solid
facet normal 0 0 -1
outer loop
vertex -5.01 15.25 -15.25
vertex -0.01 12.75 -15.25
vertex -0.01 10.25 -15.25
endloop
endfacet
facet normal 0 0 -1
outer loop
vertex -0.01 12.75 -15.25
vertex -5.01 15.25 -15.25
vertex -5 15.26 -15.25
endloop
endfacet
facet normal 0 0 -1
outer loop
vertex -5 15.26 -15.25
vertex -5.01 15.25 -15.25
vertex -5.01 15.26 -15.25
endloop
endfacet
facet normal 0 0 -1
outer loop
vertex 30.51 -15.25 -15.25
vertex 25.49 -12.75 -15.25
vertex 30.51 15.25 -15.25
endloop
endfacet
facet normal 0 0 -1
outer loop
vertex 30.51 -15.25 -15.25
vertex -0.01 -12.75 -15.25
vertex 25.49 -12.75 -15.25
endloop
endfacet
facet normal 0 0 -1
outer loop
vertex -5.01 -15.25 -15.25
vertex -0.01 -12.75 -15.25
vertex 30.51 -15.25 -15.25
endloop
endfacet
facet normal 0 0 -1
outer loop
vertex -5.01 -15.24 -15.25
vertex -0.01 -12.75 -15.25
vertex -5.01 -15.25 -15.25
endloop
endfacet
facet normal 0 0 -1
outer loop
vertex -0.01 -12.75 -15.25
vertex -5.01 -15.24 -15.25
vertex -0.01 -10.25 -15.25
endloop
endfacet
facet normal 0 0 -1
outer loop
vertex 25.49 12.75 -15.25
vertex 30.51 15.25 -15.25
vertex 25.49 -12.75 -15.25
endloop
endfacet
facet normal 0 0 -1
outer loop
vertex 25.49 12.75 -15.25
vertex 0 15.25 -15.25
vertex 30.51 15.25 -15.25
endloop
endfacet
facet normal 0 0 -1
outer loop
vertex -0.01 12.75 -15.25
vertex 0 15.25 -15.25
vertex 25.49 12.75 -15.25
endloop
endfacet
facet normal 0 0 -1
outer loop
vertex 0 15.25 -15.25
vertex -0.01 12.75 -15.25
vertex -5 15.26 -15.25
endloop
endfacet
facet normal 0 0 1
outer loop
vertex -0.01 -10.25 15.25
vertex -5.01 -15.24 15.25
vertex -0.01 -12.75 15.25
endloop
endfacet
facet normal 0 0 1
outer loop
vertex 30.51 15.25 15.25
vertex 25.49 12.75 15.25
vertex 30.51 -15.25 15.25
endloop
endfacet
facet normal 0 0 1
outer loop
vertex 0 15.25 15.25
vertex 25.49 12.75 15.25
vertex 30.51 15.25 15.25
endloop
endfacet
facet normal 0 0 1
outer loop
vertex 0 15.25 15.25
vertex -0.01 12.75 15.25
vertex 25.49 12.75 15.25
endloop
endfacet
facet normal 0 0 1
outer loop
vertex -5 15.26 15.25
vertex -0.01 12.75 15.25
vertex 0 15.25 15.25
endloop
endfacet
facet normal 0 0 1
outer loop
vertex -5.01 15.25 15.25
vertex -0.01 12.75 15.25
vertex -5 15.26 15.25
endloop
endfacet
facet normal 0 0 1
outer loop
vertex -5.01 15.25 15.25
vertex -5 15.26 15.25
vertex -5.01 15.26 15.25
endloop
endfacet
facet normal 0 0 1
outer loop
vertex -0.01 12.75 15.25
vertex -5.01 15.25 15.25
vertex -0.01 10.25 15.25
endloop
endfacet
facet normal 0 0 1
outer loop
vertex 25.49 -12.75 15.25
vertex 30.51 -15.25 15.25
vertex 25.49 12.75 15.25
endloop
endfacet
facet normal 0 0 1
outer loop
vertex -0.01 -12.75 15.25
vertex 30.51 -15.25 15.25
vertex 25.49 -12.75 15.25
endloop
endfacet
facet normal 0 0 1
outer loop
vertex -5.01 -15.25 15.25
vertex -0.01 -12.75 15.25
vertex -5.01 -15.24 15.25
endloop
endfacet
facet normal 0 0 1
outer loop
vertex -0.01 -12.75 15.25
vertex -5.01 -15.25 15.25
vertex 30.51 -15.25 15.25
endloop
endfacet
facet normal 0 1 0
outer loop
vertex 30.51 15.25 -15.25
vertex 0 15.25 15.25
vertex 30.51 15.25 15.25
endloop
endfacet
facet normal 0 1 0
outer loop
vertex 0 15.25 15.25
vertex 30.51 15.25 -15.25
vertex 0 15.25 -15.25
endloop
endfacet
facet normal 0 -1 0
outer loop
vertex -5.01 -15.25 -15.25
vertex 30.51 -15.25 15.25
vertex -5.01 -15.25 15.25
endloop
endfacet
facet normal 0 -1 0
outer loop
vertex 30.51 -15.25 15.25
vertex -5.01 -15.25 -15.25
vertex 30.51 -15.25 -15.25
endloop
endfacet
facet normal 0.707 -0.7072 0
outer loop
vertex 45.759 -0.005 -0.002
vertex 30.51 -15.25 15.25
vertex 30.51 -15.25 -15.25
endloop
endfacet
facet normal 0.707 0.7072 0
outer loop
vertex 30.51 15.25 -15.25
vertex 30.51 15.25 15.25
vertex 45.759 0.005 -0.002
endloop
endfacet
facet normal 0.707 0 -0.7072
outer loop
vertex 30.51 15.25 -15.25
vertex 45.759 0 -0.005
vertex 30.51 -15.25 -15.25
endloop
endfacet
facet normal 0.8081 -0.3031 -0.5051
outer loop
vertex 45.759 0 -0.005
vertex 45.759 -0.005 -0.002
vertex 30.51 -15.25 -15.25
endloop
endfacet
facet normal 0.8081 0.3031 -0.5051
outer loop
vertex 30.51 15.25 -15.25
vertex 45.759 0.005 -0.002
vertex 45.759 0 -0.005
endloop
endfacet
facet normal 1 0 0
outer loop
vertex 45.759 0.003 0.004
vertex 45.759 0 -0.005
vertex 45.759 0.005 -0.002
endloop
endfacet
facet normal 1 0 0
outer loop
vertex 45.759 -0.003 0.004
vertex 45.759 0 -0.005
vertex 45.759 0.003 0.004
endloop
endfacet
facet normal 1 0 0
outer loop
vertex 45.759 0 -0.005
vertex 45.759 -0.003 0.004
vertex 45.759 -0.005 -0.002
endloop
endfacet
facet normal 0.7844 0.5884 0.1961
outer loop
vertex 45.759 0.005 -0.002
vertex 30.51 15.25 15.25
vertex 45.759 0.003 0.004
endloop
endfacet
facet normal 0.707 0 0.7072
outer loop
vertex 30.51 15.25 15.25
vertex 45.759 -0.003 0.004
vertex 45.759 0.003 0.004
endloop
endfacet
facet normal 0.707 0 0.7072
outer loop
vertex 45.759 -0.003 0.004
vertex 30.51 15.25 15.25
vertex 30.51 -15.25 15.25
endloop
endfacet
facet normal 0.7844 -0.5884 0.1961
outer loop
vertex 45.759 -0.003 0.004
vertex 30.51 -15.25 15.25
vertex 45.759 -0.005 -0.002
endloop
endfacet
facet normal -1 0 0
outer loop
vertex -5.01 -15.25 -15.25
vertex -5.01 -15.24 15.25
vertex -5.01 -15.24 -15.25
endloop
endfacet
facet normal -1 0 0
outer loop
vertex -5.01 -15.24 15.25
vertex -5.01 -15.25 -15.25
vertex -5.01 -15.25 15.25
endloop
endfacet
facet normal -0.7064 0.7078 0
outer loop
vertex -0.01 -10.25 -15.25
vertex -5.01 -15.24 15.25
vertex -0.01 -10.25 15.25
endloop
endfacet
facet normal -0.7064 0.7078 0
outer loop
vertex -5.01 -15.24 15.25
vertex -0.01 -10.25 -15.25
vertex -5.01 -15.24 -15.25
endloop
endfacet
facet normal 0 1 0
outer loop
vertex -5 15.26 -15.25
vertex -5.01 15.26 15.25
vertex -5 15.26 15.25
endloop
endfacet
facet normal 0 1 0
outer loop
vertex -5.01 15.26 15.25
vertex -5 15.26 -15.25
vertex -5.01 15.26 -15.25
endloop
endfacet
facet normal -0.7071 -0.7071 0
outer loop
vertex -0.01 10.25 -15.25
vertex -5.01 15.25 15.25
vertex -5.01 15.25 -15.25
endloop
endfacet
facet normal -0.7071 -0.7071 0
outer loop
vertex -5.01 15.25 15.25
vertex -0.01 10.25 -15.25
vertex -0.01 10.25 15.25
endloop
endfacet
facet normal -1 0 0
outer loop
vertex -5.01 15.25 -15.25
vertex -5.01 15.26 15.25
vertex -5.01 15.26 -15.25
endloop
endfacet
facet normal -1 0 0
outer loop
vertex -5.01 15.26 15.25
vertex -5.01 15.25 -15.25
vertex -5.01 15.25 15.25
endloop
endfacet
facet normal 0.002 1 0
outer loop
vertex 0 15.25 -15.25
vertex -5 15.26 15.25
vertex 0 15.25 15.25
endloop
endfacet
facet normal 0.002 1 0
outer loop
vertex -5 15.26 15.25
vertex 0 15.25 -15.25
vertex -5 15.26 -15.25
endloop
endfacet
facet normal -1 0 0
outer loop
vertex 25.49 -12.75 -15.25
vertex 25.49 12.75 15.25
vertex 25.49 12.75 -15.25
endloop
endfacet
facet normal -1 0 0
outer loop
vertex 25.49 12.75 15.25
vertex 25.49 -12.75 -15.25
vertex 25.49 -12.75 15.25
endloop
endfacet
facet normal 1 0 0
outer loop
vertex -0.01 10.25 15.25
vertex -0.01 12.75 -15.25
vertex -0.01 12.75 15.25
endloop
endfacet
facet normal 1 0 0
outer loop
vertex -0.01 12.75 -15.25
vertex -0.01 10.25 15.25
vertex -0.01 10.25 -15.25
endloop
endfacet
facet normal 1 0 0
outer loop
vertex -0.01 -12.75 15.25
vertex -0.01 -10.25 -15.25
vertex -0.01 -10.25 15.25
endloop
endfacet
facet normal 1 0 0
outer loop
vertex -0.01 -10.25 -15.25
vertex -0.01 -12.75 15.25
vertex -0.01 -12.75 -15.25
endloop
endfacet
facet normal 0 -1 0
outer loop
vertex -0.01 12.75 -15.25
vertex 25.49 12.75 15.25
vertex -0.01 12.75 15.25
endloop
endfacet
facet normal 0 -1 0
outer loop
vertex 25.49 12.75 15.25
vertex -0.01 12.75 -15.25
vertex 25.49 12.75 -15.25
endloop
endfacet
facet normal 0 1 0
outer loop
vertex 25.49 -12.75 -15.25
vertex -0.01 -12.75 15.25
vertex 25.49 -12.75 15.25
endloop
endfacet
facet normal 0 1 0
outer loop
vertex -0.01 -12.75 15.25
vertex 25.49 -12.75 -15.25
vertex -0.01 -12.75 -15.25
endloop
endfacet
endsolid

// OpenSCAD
e=0.01;
wall = 2.5;
totalDim = 25.5 + wall * 2;


module sawhorse() {
    color("grey") translate([-100,-25.5/2,-e]) cube([200,25.5,25.5]);
}


module point() {
    translate([-totalDim/2, -totalDim/2,0]) cube(totalDim);
    translate([-totalDim/2, -totalDim/2,totalDim]) hull() {
         cube([totalDim, totalDim, 0.01]);
         translate([totalDim/2,totalDim/2,totalDim*1/2]) sphere(r=e);
     }
    translate([-totalDim/2, -totalDim/2,-e]) hull() {
        cube([totalDim,wall*2,e]);
        translate([-0, 0,-wall*2]) cube([totalDim,e,e]);
    }
    translate([-totalDim/2, totalDim/2-wall*2,-e]) hull() {
        cube([totalDim,wall*2,e]);
        #translate([-0, wall*2,-wall*2]) cube([totalDim,e,e]);
    }
}

rotate([0,90,0]) {
    difference() {
        point();
        sawhorse();
    }
//    sawhorse();
}
